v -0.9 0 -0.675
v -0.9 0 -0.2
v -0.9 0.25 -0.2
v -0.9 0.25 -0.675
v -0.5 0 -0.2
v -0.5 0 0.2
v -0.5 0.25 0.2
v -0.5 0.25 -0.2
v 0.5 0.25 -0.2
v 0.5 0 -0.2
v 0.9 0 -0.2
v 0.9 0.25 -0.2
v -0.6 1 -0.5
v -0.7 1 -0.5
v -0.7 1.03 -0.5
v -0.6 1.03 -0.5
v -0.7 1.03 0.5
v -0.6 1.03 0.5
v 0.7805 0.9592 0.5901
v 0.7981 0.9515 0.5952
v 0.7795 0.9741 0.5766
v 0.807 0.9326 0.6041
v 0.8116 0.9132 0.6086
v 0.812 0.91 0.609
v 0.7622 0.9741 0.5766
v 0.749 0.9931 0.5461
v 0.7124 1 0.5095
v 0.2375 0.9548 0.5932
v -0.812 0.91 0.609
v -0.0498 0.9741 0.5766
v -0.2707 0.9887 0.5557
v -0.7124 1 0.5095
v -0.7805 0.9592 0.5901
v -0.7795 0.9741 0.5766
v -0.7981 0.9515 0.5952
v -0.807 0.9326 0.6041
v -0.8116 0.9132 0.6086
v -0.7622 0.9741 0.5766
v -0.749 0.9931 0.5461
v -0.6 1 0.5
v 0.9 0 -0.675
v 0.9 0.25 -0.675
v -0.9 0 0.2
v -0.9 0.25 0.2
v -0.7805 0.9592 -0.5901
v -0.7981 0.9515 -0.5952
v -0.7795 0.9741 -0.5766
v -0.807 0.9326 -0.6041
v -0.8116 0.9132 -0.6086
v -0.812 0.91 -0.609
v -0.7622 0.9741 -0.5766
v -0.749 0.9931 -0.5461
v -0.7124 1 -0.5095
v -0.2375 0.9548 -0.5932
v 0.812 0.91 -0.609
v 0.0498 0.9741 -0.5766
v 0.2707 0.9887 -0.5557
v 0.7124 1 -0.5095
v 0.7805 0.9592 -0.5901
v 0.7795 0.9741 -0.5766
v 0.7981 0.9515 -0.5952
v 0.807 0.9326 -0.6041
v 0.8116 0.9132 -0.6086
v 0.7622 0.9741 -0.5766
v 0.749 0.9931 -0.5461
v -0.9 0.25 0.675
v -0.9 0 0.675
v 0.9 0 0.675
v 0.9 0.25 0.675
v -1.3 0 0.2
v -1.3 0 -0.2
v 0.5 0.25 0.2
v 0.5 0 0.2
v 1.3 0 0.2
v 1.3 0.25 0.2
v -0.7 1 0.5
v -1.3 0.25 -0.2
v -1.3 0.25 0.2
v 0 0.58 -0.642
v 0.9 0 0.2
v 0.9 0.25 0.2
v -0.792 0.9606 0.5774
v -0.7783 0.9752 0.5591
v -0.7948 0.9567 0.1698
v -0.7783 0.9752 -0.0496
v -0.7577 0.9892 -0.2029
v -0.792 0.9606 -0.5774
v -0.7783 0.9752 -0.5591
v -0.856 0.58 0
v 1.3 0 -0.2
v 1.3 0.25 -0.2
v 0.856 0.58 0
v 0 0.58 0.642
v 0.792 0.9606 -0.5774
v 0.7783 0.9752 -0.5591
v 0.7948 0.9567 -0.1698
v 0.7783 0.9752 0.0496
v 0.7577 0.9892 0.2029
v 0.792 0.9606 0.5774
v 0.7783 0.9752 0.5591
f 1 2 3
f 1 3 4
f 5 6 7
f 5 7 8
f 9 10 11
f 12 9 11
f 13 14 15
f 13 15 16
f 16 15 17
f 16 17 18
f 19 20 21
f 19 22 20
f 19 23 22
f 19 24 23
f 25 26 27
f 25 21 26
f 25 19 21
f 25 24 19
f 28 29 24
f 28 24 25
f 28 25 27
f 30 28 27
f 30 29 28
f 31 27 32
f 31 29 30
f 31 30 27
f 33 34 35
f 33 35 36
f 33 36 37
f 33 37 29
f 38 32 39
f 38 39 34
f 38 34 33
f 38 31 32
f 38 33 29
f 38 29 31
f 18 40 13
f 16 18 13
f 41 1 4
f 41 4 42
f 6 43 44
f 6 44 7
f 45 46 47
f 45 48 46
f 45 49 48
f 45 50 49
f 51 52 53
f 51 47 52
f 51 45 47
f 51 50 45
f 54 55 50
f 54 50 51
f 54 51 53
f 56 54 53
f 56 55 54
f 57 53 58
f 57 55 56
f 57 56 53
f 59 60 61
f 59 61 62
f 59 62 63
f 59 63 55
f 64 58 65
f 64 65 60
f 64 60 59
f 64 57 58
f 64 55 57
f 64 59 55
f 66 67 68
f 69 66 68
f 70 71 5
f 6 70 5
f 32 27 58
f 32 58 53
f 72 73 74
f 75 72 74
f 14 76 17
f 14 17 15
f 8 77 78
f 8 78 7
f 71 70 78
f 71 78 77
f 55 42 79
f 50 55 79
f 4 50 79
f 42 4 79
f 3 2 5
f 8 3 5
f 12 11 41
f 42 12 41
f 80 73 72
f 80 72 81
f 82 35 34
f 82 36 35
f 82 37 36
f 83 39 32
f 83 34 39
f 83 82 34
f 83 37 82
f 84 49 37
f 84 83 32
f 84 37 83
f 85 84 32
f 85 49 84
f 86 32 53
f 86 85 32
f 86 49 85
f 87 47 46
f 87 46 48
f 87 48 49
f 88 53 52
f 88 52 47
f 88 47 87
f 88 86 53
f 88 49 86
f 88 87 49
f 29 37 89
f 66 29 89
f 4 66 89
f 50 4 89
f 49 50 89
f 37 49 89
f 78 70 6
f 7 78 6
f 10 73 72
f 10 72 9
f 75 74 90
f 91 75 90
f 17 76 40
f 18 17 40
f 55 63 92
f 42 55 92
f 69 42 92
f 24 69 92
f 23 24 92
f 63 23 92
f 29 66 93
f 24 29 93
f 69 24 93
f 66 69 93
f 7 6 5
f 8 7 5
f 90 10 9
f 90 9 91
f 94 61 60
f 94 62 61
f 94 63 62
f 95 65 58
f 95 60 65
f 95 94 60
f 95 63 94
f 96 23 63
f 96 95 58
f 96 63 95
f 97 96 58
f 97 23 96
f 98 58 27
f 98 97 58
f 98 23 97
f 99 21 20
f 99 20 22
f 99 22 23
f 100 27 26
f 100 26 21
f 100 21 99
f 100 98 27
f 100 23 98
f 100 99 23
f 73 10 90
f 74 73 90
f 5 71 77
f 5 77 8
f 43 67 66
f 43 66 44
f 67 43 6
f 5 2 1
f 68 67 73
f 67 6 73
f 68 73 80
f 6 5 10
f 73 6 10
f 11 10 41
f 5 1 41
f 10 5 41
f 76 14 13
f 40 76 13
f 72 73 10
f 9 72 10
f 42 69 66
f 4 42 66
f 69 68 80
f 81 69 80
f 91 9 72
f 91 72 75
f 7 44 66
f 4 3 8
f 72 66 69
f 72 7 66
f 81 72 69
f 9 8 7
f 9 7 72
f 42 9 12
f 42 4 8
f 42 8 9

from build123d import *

# Parameters (mm, degrees)
SKETCH_1_W        = 1.8
SKETCH_1_H        = 1.35
EXTRUDE_1_DEPTH   = 0.25
SKETCH_2_W        = 0.8
SKETCH_2_H        = 0.4
EXTRUDE_2_DEPTH   = 0.25
EXTRUDE_2_2_DEPTH = 0.25
SKETCH_2_2_W      = 0.8
SKETCH_2_2_H      = 0.4
EXTRUDE_3_DEPTH   = 0.25
EXTRUDE_3_2_DEPTH = 0.25
SKETCH_5_W        = 0.1
SKETCH_5_H        = 1
EXTRUDE_4_DEPTH   = 0.03
FILLET_1_R        = 0.1


with BuildPart() as part:
    # Эскиз1 → Бобышка-Вытянуть1 (new body)
    with BuildSketch(Plane(origin=(0, 0, 0), x_dir=(1, 0, 0), z_dir=(0, 1, 0))):
        Rectangle(SKETCH_1_W, SKETCH_1_H)
    extrude(amount=EXTRUDE_1_DEPTH)


with BuildPart() as body_2:
    # Эскиз2 → Бобышка-Вытянуть2 (new body)
    with BuildSketch(Plane(origin=(0, 0, 0), x_dir=(1, 0, 0), z_dir=(0, 1, 0))):
        with Locations((0.9, 0)):
            Rectangle(SKETCH_2_W, SKETCH_2_H)
    extrude(amount=EXTRUDE_2_DEPTH)


with BuildPart() as body_3:
    # Эскиз2 → Extrude 2 2 (new body)
    with BuildSketch(Plane(origin=(0, 0, 0), x_dir=(1, 0, 0), z_dir=(0, 1, 0))):
        with Locations((-0.9, 0)):
            Rectangle(SKETCH_2_W, SKETCH_2_H)
    extrude(amount=EXTRUDE_2_2_DEPTH)


with BuildPart() as part_1:
    add(part.part)

    # Combine 1: cut body 3, body 2
    add(body_3.part, mode=Mode.SUBTRACT)
    add(body_2.part, mode=Mode.SUBTRACT)


with BuildPart() as body_2_2:
    # Эскиз2<2> → Бобышка-Вытянуть3 (new body)
    with BuildSketch(Plane(origin=(0, 0, 0), x_dir=(1, 0, 0), z_dir=(0, 1, 0))):
        with Locations((0.9, 0)):
            Rectangle(SKETCH_2_2_W, SKETCH_2_2_H)
    extrude(amount=EXTRUDE_3_DEPTH)


with BuildPart() as body_3_2:
    # Эскиз2<2> → Extrude 3 2 (new body)
    with BuildSketch(Plane(origin=(0, 0, 0), x_dir=(1, 0, 0), z_dir=(0, 1, 0))):
        with Locations((-0.9, 0)):
            Rectangle(SKETCH_2_2_W, SKETCH_2_2_H)
    extrude(amount=EXTRUDE_3_2_DEPTH)


with BuildPart() as body_4:
    # Эскиз3 → По сечениям1 section 0
    with BuildSketch(Plane(origin=(0, 0.25, 0), x_dir=(1, 0, 0), z_dir=(0, 1, 0))):
        with BuildLine():
            Line((0.9, -0.675), (-0.9, -0.675))
            Line((-0.9, -0.675), (-0.9, 0.675))
            Line((-0.9, 0.675), (0.9, 0.675))
            Line((0.9, 0.675), (0.9, -0.675))
        make_face()
    # Эскиз4 → По сечениям1 section 1
    with BuildSketch(Plane(origin=(0, 1, 0), x_dir=(1, 0, 0), z_dir=(0, 1, 0))):
        with BuildLine():
            Line((0.8, -0.6), (-0.8, -0.6))
            Line((-0.8, -0.6), (-0.8, 0.6))
            Line((-0.8, 0.6), (0.8, 0.6))
            Line((0.8, 0.6), (0.8, -0.6))
        make_face()
    loft()

    # Скругление1
    fillet_1_edges = [body_4.edges().sort_by_distance(p)[0] for p in [
        (0, 1, 0.6),
        (0.8, 1, 0),
        (0, 1, -0.6),
        (-0.8, 1, 0),
    ]]
    fillet(fillet_1_edges, radius=FILLET_1_R)


with BuildPart() as body_5:
    # Эскиз5 → Бобышка-Вытянуть4 (new body)
    with BuildSketch(Plane(origin=(0, 1, 0), x_dir=(1, 0, 0), z_dir=(0, 1, 0))):
        with Locations((-0.65, 0)):
            Rectangle(SKETCH_5_W, SKETCH_5_H)
    extrude(amount=EXTRUDE_4_DEPTH)


solid = Compound([part_1.part, body_2_2.part, body_3_2.part, body_4.part, body_5.part])
